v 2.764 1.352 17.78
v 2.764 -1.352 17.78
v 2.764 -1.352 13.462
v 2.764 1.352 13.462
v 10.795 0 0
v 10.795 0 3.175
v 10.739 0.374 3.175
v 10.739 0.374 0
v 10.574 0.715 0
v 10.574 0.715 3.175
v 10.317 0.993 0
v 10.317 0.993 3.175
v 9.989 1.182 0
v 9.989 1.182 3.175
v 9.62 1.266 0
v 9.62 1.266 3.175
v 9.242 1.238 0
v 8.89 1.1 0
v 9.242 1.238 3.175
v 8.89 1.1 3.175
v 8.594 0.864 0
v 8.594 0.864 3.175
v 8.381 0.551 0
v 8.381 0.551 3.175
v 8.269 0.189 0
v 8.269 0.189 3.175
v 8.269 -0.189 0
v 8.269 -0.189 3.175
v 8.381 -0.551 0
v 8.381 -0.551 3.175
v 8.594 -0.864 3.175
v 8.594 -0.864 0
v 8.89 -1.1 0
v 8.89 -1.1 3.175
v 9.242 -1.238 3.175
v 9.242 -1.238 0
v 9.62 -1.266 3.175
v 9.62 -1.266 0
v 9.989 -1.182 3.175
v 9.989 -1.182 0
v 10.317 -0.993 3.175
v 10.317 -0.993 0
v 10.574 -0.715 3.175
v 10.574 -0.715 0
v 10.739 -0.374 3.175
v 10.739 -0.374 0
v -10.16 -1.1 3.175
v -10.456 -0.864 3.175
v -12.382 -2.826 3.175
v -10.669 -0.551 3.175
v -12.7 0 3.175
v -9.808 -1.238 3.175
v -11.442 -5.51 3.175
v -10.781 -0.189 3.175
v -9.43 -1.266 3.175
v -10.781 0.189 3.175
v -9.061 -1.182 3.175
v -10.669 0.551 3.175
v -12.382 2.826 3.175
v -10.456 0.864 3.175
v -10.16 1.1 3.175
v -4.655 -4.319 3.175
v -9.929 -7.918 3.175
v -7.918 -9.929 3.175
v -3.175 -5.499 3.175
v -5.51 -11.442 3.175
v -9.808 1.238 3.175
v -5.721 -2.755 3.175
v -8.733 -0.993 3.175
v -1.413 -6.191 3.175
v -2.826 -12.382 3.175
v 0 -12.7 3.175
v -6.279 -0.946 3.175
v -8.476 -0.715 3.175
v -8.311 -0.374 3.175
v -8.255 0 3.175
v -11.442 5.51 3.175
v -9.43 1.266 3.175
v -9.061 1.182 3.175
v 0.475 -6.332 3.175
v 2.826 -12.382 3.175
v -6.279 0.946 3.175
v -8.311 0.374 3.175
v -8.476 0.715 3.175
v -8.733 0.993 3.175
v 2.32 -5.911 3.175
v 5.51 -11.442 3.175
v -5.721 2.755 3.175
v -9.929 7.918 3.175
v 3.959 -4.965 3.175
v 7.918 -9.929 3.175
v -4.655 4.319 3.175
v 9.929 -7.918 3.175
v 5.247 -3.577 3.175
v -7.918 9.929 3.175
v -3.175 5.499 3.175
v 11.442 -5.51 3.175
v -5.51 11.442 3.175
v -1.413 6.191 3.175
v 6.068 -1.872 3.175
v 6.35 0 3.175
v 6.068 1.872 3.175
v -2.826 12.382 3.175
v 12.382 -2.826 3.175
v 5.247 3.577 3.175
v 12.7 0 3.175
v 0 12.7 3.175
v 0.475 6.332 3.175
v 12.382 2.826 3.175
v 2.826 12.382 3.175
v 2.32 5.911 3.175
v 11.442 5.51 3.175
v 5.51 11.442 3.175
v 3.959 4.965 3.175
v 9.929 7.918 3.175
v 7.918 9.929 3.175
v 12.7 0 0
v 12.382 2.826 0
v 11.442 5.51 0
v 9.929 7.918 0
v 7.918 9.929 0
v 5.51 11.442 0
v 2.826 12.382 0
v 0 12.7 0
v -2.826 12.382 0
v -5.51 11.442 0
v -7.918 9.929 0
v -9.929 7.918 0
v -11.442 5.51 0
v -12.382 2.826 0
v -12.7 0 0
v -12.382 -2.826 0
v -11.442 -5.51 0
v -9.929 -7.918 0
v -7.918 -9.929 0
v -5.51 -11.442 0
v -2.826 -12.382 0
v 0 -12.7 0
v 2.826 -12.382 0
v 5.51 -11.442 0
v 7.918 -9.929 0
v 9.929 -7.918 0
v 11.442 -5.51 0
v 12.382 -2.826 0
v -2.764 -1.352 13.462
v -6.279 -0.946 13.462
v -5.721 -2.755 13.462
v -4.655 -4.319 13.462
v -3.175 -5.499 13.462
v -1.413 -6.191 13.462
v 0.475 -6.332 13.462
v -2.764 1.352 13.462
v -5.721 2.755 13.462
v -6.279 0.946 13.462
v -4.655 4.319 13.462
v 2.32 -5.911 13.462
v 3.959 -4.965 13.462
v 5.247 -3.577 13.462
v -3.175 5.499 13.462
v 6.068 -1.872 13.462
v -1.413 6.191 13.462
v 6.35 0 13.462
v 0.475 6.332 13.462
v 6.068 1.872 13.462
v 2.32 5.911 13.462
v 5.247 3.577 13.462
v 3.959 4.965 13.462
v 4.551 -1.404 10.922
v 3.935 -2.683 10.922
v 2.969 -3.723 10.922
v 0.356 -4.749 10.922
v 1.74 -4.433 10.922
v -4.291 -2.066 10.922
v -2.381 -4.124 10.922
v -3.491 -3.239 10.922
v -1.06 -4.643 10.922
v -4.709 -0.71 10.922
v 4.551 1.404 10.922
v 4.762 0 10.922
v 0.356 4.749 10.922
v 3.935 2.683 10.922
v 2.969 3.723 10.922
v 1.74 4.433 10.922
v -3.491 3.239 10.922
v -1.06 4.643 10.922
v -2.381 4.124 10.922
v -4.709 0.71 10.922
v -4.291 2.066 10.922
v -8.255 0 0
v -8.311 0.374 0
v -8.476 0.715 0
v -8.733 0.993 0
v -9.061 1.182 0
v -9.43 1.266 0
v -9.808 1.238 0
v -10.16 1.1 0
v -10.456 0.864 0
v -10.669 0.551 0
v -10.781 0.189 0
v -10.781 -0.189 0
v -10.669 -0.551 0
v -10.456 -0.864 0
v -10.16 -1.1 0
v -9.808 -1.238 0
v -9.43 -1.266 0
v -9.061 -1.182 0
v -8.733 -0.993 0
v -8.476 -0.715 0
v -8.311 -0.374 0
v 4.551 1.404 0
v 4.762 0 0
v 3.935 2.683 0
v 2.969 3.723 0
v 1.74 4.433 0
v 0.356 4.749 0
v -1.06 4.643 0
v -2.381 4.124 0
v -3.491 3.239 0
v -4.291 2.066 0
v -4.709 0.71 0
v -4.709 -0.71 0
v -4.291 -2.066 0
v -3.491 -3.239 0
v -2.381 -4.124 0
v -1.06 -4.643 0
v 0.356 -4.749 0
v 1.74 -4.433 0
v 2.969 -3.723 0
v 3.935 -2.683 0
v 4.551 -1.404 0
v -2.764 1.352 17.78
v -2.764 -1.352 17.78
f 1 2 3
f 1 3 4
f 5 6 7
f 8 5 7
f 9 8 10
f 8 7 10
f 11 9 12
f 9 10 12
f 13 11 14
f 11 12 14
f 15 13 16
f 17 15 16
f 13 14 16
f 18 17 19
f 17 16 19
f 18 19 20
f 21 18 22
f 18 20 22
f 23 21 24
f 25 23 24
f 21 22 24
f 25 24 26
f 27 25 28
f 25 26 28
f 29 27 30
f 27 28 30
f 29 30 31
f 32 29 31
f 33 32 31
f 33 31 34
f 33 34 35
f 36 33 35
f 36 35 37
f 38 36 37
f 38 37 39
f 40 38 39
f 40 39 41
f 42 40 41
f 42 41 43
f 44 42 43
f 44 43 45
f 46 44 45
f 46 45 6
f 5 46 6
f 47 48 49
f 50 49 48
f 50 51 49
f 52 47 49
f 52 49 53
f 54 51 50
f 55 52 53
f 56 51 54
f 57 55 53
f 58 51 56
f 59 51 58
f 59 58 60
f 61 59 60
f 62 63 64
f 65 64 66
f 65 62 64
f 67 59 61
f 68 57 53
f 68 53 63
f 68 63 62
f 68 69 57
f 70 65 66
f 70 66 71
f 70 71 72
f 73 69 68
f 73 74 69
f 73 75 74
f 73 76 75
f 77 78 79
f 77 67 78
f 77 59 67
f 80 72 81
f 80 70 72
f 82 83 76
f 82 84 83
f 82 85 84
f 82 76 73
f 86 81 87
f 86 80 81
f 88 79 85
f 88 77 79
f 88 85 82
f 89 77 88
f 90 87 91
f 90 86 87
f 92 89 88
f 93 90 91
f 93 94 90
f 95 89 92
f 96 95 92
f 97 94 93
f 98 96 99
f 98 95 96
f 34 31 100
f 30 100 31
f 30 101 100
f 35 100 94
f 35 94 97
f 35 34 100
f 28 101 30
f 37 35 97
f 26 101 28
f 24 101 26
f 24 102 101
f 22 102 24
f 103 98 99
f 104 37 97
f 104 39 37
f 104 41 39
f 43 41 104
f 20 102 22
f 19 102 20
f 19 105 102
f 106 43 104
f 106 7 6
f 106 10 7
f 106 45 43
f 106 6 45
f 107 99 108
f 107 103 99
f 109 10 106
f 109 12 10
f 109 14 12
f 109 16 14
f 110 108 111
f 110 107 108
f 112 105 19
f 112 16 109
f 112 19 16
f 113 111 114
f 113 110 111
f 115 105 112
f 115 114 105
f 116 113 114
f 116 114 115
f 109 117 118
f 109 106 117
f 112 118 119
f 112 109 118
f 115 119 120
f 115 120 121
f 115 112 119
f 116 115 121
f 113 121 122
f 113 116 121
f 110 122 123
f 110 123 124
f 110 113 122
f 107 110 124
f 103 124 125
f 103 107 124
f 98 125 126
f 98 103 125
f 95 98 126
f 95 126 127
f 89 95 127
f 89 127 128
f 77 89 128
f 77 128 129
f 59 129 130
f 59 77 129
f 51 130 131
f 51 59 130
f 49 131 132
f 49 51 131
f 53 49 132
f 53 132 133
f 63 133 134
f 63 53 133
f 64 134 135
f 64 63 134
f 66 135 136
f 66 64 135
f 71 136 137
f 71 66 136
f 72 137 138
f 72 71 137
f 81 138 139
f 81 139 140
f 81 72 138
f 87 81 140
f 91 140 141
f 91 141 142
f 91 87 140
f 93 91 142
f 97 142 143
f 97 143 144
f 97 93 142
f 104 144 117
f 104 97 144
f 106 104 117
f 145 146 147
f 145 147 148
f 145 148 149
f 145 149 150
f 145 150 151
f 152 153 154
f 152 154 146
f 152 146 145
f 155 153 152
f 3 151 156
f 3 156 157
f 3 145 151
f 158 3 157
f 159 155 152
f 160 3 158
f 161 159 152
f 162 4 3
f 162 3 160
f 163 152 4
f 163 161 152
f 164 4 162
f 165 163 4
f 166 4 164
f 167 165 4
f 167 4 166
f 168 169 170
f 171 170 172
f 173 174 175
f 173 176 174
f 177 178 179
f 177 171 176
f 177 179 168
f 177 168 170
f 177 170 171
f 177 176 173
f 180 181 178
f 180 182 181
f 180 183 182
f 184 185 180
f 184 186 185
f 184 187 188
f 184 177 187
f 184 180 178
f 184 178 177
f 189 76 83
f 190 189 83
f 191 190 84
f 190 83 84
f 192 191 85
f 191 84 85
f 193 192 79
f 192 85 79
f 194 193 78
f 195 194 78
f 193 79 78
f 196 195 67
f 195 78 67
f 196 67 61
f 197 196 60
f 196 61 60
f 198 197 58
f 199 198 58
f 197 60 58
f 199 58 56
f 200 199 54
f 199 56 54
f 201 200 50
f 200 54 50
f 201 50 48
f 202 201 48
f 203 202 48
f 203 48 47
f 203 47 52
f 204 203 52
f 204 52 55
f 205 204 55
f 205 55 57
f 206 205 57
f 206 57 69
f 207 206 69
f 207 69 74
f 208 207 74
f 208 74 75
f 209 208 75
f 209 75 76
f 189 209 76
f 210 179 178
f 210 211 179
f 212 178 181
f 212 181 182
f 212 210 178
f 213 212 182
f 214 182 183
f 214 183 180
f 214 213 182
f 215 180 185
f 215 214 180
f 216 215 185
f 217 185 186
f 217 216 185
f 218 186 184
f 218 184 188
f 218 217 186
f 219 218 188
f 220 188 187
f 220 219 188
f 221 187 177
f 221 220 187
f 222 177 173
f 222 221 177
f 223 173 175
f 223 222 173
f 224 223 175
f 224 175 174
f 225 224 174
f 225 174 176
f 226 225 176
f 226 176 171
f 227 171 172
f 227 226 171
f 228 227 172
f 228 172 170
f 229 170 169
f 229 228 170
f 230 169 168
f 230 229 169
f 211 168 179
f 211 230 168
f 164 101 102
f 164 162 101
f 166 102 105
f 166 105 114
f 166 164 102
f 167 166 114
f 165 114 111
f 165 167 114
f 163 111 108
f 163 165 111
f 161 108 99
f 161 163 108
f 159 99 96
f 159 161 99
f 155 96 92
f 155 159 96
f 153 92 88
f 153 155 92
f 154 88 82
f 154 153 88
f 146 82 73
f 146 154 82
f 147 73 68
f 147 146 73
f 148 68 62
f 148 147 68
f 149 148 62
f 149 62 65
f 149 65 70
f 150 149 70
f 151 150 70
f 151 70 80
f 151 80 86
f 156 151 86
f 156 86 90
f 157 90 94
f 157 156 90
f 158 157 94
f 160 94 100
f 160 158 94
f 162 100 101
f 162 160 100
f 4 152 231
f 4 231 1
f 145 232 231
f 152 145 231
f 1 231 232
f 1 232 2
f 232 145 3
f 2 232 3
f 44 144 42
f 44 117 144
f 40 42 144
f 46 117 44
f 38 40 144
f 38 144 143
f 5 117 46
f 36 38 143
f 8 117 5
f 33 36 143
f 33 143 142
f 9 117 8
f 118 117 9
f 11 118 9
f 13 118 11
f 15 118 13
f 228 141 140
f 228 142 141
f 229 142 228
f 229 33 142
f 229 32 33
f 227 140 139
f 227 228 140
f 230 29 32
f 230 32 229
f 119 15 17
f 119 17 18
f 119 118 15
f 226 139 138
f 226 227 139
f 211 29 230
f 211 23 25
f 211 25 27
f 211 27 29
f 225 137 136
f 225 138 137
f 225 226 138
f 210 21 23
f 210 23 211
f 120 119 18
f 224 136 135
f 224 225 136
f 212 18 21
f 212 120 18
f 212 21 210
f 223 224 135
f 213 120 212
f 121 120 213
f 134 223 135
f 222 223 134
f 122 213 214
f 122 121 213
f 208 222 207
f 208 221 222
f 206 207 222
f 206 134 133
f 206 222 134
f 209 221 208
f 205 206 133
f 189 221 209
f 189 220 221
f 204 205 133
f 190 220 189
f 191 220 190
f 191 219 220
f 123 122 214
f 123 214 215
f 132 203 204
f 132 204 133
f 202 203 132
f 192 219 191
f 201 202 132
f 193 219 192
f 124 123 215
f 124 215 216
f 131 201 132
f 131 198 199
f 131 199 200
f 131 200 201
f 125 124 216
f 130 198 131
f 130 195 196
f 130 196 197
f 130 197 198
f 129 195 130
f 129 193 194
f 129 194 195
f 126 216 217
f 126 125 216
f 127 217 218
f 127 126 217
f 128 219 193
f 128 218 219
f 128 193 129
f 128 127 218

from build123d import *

# Parameters (mm, degrees)
F2_W     = 5.528318
F2_H     = 2.70489
F3_DEPTH = 4.318
F4_R     = 1.27
F5_DEPTH = 3.176


with BuildPart() as f1:
    # F0 (on Front) → F1 (revolve)
    with BuildSketch(Plane.XZ):
        Polygon((6.35, 13.462), (0, 13.462), (0, 10.922), (4.7625, 10.922), (4.7625, 0), (12.7, 0), (12.7, 3.175), (6.35, 3.175), align=None)
    revolve(axis=Axis((0, 0, 12.192), (0, 0, 1)))

    # F2 (on face) → F3 (join)
    with BuildSketch(Plane.XY.offset(13.462)):
        Rectangle(F2_W, F2_H)
    extrude(amount=F3_DEPTH)

    # F4 (on face) → F5 (cut, through all)
    with BuildSketch(Plane.XY.offset(3.175)):
        with Locations((-9.525, 0)):
            Circle(F4_R)
        with Locations((9.525, 0)):
            Circle(F4_R)
    extrude(amount=-F5_DEPTH, mode=Mode.SUBTRACT)


solid = f1.part
